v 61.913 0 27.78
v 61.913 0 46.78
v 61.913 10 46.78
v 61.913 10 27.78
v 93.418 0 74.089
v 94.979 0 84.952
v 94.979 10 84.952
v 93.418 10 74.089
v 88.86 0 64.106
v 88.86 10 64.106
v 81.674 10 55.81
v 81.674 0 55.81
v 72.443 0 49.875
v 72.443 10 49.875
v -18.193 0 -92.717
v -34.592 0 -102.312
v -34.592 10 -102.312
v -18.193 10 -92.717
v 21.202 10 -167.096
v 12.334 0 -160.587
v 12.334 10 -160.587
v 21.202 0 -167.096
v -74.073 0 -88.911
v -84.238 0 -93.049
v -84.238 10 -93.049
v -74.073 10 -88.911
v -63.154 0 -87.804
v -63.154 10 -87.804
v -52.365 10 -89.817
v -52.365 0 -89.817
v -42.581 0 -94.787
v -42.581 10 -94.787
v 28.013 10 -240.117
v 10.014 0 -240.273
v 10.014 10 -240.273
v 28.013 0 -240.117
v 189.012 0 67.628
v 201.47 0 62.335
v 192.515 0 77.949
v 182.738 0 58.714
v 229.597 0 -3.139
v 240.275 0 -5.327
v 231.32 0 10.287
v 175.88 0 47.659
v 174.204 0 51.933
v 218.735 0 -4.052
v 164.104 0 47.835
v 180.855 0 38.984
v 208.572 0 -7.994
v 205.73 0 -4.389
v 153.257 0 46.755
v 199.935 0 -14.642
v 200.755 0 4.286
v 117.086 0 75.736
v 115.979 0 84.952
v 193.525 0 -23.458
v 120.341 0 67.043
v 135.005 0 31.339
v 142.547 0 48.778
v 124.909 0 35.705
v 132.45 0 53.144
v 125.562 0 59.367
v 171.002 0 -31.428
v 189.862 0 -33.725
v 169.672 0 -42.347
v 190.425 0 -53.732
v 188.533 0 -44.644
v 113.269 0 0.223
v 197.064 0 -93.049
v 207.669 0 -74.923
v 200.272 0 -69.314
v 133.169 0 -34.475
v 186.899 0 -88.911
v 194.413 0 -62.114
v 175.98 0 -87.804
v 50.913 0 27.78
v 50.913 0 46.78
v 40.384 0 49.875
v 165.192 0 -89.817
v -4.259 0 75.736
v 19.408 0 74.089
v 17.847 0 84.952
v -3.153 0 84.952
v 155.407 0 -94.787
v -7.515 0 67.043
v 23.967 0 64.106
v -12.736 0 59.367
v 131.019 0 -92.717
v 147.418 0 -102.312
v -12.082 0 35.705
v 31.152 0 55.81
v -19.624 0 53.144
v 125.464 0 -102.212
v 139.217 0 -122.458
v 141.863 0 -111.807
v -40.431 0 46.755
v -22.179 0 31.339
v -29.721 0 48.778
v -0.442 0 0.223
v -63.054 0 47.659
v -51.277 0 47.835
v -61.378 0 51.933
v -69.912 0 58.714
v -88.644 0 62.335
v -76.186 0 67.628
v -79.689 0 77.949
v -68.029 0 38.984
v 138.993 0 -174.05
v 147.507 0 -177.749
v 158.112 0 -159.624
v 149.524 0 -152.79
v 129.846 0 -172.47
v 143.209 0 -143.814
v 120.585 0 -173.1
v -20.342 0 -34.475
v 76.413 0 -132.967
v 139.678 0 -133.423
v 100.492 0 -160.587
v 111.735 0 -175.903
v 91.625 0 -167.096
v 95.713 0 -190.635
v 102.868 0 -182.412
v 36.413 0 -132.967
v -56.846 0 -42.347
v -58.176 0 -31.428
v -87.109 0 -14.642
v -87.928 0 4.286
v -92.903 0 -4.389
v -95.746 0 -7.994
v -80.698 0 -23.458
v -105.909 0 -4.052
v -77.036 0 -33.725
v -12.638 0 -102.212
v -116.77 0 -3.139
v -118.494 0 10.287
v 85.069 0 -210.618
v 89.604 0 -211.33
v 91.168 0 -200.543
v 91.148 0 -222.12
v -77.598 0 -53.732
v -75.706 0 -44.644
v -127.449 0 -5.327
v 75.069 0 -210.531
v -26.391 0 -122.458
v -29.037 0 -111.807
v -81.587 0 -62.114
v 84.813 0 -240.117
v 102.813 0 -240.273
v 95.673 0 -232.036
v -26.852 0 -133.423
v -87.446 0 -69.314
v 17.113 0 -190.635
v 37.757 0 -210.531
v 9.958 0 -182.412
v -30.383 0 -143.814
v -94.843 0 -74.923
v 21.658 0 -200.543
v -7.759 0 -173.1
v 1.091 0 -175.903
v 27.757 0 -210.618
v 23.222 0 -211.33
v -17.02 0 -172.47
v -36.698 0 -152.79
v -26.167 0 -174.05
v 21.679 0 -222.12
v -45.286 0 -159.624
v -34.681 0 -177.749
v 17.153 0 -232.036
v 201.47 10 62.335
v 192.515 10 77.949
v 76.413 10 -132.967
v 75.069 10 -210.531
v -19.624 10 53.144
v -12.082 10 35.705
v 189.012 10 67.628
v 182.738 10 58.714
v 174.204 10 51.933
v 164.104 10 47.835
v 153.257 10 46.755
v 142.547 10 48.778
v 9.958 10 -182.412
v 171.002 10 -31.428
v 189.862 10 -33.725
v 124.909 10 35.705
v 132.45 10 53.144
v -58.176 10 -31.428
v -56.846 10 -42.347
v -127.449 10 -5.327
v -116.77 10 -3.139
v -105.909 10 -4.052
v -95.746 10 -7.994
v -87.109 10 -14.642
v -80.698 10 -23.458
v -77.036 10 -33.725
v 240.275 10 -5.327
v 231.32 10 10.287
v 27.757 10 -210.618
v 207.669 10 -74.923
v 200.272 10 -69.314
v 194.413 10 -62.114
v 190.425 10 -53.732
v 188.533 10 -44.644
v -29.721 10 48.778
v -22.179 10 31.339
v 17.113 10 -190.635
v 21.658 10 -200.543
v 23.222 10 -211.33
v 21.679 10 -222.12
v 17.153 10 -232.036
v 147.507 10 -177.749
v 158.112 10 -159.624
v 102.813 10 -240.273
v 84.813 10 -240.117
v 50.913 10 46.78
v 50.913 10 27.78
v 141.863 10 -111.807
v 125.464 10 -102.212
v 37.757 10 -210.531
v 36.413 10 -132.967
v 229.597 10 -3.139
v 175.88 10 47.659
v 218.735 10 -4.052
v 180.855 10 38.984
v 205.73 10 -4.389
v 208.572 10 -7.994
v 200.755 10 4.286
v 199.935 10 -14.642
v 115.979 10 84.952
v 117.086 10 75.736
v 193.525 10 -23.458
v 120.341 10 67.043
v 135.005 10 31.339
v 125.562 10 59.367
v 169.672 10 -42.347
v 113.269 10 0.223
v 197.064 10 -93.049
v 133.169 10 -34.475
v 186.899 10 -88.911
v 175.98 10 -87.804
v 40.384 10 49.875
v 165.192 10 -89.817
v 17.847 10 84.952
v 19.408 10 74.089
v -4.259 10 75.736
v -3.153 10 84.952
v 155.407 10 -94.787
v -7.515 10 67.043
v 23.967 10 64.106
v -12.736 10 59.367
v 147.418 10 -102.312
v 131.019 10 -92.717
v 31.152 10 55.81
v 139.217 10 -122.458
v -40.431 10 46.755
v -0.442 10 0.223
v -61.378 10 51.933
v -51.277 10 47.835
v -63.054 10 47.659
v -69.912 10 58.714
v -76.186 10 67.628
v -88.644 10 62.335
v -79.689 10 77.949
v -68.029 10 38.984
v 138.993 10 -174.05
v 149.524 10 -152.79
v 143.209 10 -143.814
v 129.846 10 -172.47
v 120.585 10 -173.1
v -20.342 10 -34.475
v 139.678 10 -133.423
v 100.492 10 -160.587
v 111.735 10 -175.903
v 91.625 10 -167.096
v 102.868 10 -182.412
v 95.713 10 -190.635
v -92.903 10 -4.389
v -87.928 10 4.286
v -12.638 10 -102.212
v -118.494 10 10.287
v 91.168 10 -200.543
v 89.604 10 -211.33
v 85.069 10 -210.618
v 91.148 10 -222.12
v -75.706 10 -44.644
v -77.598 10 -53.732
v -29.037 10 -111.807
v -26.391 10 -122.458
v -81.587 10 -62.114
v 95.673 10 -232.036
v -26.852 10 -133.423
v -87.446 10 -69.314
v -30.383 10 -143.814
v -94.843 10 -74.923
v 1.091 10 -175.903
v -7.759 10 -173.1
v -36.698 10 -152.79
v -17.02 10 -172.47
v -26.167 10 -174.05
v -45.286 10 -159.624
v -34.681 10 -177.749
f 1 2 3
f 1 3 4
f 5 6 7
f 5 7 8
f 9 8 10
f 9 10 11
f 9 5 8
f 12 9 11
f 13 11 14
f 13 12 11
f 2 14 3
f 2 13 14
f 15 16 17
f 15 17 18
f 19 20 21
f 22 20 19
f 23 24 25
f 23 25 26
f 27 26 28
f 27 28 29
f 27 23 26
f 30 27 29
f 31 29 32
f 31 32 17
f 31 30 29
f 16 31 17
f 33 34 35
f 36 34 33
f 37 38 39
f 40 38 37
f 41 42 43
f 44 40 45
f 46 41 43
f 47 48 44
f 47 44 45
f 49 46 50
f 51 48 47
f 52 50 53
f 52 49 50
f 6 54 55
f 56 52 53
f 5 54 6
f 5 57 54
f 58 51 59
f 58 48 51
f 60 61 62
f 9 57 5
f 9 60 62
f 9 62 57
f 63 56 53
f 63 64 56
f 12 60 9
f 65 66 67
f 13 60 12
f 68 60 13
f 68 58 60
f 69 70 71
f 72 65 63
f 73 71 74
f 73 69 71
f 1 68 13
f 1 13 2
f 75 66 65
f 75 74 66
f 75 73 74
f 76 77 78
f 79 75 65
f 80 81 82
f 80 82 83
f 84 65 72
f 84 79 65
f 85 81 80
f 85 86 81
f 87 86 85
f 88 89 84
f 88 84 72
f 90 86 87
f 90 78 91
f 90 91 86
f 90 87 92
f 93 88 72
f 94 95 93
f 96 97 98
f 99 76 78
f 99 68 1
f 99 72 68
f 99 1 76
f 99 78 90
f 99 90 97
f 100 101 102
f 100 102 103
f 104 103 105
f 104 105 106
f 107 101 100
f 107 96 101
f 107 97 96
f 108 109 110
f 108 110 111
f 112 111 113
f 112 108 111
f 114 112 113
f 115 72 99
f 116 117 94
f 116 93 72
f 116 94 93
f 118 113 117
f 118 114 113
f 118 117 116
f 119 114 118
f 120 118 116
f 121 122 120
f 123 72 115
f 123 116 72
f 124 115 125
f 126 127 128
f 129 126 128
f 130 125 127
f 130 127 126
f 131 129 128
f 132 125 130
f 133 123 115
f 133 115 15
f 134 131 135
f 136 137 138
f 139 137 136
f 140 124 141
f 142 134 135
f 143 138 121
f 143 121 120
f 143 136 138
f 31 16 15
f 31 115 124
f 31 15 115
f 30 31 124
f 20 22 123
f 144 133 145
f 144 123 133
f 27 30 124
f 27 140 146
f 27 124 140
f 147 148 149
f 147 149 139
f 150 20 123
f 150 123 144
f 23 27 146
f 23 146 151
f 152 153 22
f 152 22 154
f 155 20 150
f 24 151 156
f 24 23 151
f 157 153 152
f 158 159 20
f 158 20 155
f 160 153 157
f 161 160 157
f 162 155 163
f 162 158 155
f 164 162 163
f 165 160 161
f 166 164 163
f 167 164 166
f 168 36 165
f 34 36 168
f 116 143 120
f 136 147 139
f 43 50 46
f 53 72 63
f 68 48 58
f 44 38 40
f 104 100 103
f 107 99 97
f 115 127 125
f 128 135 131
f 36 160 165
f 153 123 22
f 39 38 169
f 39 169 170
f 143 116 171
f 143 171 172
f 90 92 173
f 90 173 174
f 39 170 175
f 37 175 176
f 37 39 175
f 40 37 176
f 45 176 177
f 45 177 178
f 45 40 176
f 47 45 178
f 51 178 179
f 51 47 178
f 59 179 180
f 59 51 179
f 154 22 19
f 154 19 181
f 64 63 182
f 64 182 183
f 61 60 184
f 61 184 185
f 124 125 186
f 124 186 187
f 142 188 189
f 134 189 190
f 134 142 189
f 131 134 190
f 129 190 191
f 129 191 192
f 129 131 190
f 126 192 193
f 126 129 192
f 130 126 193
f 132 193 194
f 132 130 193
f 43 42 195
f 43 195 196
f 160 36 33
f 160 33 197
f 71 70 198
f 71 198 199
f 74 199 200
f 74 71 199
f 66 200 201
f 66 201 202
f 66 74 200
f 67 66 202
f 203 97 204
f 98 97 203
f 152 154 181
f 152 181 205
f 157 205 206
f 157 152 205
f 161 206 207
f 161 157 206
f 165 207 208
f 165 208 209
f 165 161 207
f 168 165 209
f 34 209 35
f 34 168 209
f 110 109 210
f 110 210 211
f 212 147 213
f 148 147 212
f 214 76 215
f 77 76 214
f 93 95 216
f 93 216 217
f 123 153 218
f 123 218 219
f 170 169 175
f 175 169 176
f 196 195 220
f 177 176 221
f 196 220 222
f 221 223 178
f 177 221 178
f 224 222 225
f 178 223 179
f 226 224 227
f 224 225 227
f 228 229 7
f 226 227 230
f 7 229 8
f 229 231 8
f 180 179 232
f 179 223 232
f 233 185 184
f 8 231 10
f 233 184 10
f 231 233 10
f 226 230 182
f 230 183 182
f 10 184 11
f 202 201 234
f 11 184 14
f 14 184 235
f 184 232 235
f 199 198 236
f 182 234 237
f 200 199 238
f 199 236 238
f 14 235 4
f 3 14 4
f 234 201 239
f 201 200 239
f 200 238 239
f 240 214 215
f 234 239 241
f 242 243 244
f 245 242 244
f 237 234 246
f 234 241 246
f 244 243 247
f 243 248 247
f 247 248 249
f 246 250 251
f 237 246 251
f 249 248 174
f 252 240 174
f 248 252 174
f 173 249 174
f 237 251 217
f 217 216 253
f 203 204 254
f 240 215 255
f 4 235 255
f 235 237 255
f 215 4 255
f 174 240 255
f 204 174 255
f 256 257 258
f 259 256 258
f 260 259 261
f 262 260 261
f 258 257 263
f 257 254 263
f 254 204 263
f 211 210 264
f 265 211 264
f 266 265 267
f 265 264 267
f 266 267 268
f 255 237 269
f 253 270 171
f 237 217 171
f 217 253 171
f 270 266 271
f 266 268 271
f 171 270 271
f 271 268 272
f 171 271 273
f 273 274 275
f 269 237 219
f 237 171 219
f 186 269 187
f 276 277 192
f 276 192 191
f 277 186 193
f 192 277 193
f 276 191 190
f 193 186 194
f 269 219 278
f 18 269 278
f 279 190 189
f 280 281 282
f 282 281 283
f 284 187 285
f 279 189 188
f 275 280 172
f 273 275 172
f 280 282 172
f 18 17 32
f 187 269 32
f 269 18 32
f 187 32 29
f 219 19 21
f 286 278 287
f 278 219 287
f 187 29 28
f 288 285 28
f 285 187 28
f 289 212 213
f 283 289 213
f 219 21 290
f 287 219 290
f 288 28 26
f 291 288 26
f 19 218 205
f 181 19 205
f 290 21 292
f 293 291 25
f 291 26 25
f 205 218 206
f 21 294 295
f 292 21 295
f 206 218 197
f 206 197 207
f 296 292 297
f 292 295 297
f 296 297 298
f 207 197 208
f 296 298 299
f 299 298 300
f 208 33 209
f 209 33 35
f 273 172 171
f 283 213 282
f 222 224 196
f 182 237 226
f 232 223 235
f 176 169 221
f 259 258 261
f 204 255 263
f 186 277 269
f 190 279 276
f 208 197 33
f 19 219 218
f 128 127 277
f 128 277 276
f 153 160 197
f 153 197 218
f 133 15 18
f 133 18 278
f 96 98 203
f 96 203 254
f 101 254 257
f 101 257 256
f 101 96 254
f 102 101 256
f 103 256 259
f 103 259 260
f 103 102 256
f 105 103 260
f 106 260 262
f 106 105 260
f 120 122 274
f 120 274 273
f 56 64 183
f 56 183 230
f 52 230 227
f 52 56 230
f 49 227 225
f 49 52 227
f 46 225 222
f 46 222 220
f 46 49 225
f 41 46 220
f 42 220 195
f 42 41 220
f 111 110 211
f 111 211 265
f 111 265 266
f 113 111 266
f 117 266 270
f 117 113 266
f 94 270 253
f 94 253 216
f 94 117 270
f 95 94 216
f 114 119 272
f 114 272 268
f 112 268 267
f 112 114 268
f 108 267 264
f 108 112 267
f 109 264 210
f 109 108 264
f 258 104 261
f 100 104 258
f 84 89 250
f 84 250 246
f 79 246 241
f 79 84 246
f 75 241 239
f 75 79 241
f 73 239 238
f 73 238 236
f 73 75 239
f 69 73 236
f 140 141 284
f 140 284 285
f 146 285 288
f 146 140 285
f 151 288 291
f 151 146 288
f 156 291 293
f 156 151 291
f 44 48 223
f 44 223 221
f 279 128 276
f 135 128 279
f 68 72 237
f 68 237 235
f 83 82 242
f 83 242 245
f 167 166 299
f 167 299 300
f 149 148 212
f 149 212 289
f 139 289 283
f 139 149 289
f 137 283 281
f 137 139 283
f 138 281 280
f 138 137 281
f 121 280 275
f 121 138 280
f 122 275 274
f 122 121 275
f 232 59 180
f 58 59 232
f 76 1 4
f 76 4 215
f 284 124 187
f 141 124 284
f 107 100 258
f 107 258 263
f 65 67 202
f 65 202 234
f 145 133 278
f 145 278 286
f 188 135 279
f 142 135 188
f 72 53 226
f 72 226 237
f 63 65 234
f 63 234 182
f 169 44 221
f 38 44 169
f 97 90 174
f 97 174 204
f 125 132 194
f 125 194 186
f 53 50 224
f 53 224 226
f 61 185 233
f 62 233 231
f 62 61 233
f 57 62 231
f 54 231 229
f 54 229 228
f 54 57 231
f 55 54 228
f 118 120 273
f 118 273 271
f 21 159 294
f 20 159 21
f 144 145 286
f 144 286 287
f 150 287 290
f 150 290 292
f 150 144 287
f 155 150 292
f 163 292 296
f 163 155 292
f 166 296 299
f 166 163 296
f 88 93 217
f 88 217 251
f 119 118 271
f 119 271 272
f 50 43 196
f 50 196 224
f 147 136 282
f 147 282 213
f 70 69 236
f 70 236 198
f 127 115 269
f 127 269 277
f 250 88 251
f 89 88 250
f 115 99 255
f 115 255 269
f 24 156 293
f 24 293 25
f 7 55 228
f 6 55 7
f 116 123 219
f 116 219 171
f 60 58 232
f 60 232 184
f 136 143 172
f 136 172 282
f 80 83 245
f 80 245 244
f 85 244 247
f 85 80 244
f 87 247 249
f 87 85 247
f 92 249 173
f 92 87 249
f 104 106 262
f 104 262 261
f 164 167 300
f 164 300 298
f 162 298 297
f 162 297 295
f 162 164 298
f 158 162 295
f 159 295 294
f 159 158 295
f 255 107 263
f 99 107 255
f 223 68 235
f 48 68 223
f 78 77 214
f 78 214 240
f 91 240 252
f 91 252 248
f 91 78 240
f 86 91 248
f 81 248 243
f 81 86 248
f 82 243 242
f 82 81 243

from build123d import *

# Parameters (mm, degrees)
BOSS_EXTRU_1_DEPTH = 10


with BuildPart() as part:
    # Esquisse2 → Boss.-Extru.1 (new body)
    with BuildSketch(Plane(origin=(0, 0, 0), x_dir=(1, 0, 0), z_dir=(0, 1, 0))):
        with BuildLine():
            Line((36.413113552, 132.966619465), (76.413113552, 132.966619465))
            Line((76.413113552, 132.966619465), (75.069459937, 210.531035708))
            Line((75.069459937, 210.531035708), (85.069084249, 210.617716914))
            Line((85.069084249, 210.617716914), (84.813374692, 240.116608632))
            Line((84.813374692, 240.116608632), (102.812698453, 240.272634802))
            ThreePointArc((102.812698453, 240.272634802), (89.604268477, 211.329810699), (102.868184053, 182.412372481))
            Line((102.868184053, 182.412372481), (91.624672702, 167.096255072))
            Line((91.624672702, 167.096255072), (100.49189857, 160.586853763))
            Line((100.49189857, 160.586853763), (111.735409922, 175.902971172))
            ThreePointArc((111.735409922, 175.902971172), (129.846153012, 172.469977356), (147.507194899, 177.749377064))
            Line((147.507194899, 177.749377064), (158.112115685, 159.623824517))
            ThreePointArc((158.112115685, 159.623824517), (141.072313982, 138.74483792), (141.863284971, 111.806736869))
            Line((141.863284971, 111.806736869), (125.463975524, 102.211808539))
            Line((125.463975524, 102.211808539), (131.01893403, 92.717471491))
            Line((131.01893403, 92.717471491), (147.418243478, 102.312399821))
            ThreePointArc((147.418243478, 102.312399821), (170.51388989, 88.424345956), (197.063848919, 93.048910681))
            Line((197.063848919, 93.048910681), (207.668769705, 74.923358135))
            ThreePointArc((207.668769705, 74.923358135), (194.413310744, 62.114093146), (188.532513668, 44.644099226))
            Line((188.532513668, 44.644099226), (169.671901636, 42.346858754))
            Line((169.671901636, 42.346858754), (171.001882962, 31.427557051))
            Line((171.001882962, 31.427557051), (189.862494994, 33.724797523))
            ThreePointArc((189.862494994, 33.724797523), (208.572406926, 7.993709614), (240.274776322, 5.32735176))
            Line((240.274776322, 5.32735176), (231.319855268, -10.287045088))
            Line((231.319855268, -10.287045088), (205.729593768, 4.389075528))
            Line((205.729593768, 4.389075528), (200.754637626, -4.285589387))
            Line((200.754637626, -4.285589387), (133.168524557, 34.475325478))
            Line((133.168524557, 34.475325478), (113.268699993, -0.223334184))
            Line((113.268699993, -0.223334184), (180.854813062, -38.984249048))
            Line((180.854813062, -38.984249048), (175.879856921, -47.658913964))
            Line((175.879856921, -47.658913964), (201.470118422, -62.33503458))
            Line((201.470118422, -62.33503458), (192.515197368, -77.949431428))
            ThreePointArc((192.515197368, -77.949431428), (174.204229484, -51.93293388), (142.546738059, -48.778108028))
            Line((142.546738059, -48.778108028), (135.004997884, -31.339009567))
            Line((135.004997884, -31.339009567), (124.908677722, -35.705280195))
            Line((124.908677722, -35.705280195), (132.450417897, -53.144378656))
            ThreePointArc((132.450417897, -53.144378656), (120.34147001, -67.042502374), (115.979474134, -84.952205157))
            Line((115.979474134, -84.952205157), (94.979474134, -84.952205157))
            ThreePointArc((94.979474134, -84.952205157), (85.563406447, -59.700975629), (61.913113552, -46.780040317))
            Line((61.913113552, -46.780040317), (61.913113552, -27.780040317))
            Line((61.913113552, -27.780040317), (50.913113552, -27.780040317))
            Line((50.913113552, -27.780040317), (50.913113552, -46.780040317))
            ThreePointArc((50.913113552, -46.780040317), (27.262820657, -59.700975629), (17.84675297, -84.952205157))
            Line((17.84675297, -84.952205157), (-3.15324703, -84.952205157))
            ThreePointArc((-3.15324703, -84.952205157), (-7.515242906, -67.042502374), (-19.624190793, -53.144378656))
            Line((-19.624190793, -53.144378656), (-12.082450618, -35.705280195))
            Line((-12.082450618, -35.705280195), (-22.17877078, -31.339009567))
            Line((-22.17877078, -31.339009567), (-29.720510955, -48.778108028))
            ThreePointArc((-29.720510955, -48.778108028), (-61.37800238, -51.93293388), (-79.688970264, -77.949431428))
            Line((-79.688970264, -77.949431428), (-88.643891318, -62.33503458))
            Line((-88.643891318, -62.33503458), (-63.053629817, -47.658913964))
            Line((-63.053629817, -47.658913964), (-68.028585958, -38.984249048))
            Line((-68.028585958, -38.984249048), (-0.442472889, -0.223334184))
            Line((-0.442472889, -0.223334184), (-20.342297454, 34.475325478))
            Line((-20.342297454, 34.475325478), (-87.928410523, -4.285589387))
            Line((-87.928410523, -4.285589387), (-92.903366664, 4.389075528))
            Line((-92.903366664, 4.389075528), (-118.493628164, -10.287045088))
            Line((-118.493628164, -10.287045088), (-127.448549218, 5.32735176))
            ThreePointArc((-127.448549218, 5.32735176), (-95.746179823, 7.993709614), (-77.03626789, 33.724797523))
            Line((-77.03626789, 33.724797523), (-58.175655858, 31.427557051))
            Line((-58.175655858, 31.427557051), (-56.845674532, 42.346858754))
            Line((-56.845674532, 42.346858754), (-75.706286564, 44.644099226))
            ThreePointArc((-75.706286564, 44.644099226), (-81.58708364, 62.114093146), (-94.842542601, 74.923358135))
            Line((-94.842542601, 74.923358135), (-84.237621815, 93.048910681))
            ThreePointArc((-84.237621815, 93.048910681), (-57.687662786, 88.424345956), (-34.592016374, 102.312399821))
            Line((-34.592016374, 102.312399821), (-18.192706927, 92.717471491))
            Line((-18.192706927, 92.717471491), (-12.63774842, 102.211808539))
            Line((-12.63774842, 102.211808539), (-29.037057867, 111.806736869))
            ThreePointArc((-29.037057867, 111.806736869), (-28.246086878, 138.74483792), (-45.285888581, 159.623824517))
            Line((-45.285888581, 159.623824517), (-34.680967795, 177.749377064))
            ThreePointArc((-34.680967795, 177.749377064), (-17.019925908, 172.469977356), (1.090817182, 175.902971172))
            Line((1.090817182, 175.902971172), (12.334328534, 160.586853763))
            Line((12.334328534, 160.586853763), (21.201554402, 167.096255072))
            Line((21.201554402, 167.096255072), (9.95804305, 182.412372481))
            ThreePointArc((9.95804305, 182.412372481), (23.221958626, 211.329810699), (10.013528651, 240.272634802))
            Line((10.013528651, 240.272634802), (28.012852411, 240.116608632))
            Line((28.012852411, 240.116608632), (27.757142855, 210.617716914))
            Line((27.757142855, 210.617716914), (37.756767167, 210.531035708))
            Line((37.756767167, 210.531035708), (36.413113552, 132.966619465))
        make_face()
    extrude(amount=BOSS_EXTRU_1_DEPTH)


solid = part.part
